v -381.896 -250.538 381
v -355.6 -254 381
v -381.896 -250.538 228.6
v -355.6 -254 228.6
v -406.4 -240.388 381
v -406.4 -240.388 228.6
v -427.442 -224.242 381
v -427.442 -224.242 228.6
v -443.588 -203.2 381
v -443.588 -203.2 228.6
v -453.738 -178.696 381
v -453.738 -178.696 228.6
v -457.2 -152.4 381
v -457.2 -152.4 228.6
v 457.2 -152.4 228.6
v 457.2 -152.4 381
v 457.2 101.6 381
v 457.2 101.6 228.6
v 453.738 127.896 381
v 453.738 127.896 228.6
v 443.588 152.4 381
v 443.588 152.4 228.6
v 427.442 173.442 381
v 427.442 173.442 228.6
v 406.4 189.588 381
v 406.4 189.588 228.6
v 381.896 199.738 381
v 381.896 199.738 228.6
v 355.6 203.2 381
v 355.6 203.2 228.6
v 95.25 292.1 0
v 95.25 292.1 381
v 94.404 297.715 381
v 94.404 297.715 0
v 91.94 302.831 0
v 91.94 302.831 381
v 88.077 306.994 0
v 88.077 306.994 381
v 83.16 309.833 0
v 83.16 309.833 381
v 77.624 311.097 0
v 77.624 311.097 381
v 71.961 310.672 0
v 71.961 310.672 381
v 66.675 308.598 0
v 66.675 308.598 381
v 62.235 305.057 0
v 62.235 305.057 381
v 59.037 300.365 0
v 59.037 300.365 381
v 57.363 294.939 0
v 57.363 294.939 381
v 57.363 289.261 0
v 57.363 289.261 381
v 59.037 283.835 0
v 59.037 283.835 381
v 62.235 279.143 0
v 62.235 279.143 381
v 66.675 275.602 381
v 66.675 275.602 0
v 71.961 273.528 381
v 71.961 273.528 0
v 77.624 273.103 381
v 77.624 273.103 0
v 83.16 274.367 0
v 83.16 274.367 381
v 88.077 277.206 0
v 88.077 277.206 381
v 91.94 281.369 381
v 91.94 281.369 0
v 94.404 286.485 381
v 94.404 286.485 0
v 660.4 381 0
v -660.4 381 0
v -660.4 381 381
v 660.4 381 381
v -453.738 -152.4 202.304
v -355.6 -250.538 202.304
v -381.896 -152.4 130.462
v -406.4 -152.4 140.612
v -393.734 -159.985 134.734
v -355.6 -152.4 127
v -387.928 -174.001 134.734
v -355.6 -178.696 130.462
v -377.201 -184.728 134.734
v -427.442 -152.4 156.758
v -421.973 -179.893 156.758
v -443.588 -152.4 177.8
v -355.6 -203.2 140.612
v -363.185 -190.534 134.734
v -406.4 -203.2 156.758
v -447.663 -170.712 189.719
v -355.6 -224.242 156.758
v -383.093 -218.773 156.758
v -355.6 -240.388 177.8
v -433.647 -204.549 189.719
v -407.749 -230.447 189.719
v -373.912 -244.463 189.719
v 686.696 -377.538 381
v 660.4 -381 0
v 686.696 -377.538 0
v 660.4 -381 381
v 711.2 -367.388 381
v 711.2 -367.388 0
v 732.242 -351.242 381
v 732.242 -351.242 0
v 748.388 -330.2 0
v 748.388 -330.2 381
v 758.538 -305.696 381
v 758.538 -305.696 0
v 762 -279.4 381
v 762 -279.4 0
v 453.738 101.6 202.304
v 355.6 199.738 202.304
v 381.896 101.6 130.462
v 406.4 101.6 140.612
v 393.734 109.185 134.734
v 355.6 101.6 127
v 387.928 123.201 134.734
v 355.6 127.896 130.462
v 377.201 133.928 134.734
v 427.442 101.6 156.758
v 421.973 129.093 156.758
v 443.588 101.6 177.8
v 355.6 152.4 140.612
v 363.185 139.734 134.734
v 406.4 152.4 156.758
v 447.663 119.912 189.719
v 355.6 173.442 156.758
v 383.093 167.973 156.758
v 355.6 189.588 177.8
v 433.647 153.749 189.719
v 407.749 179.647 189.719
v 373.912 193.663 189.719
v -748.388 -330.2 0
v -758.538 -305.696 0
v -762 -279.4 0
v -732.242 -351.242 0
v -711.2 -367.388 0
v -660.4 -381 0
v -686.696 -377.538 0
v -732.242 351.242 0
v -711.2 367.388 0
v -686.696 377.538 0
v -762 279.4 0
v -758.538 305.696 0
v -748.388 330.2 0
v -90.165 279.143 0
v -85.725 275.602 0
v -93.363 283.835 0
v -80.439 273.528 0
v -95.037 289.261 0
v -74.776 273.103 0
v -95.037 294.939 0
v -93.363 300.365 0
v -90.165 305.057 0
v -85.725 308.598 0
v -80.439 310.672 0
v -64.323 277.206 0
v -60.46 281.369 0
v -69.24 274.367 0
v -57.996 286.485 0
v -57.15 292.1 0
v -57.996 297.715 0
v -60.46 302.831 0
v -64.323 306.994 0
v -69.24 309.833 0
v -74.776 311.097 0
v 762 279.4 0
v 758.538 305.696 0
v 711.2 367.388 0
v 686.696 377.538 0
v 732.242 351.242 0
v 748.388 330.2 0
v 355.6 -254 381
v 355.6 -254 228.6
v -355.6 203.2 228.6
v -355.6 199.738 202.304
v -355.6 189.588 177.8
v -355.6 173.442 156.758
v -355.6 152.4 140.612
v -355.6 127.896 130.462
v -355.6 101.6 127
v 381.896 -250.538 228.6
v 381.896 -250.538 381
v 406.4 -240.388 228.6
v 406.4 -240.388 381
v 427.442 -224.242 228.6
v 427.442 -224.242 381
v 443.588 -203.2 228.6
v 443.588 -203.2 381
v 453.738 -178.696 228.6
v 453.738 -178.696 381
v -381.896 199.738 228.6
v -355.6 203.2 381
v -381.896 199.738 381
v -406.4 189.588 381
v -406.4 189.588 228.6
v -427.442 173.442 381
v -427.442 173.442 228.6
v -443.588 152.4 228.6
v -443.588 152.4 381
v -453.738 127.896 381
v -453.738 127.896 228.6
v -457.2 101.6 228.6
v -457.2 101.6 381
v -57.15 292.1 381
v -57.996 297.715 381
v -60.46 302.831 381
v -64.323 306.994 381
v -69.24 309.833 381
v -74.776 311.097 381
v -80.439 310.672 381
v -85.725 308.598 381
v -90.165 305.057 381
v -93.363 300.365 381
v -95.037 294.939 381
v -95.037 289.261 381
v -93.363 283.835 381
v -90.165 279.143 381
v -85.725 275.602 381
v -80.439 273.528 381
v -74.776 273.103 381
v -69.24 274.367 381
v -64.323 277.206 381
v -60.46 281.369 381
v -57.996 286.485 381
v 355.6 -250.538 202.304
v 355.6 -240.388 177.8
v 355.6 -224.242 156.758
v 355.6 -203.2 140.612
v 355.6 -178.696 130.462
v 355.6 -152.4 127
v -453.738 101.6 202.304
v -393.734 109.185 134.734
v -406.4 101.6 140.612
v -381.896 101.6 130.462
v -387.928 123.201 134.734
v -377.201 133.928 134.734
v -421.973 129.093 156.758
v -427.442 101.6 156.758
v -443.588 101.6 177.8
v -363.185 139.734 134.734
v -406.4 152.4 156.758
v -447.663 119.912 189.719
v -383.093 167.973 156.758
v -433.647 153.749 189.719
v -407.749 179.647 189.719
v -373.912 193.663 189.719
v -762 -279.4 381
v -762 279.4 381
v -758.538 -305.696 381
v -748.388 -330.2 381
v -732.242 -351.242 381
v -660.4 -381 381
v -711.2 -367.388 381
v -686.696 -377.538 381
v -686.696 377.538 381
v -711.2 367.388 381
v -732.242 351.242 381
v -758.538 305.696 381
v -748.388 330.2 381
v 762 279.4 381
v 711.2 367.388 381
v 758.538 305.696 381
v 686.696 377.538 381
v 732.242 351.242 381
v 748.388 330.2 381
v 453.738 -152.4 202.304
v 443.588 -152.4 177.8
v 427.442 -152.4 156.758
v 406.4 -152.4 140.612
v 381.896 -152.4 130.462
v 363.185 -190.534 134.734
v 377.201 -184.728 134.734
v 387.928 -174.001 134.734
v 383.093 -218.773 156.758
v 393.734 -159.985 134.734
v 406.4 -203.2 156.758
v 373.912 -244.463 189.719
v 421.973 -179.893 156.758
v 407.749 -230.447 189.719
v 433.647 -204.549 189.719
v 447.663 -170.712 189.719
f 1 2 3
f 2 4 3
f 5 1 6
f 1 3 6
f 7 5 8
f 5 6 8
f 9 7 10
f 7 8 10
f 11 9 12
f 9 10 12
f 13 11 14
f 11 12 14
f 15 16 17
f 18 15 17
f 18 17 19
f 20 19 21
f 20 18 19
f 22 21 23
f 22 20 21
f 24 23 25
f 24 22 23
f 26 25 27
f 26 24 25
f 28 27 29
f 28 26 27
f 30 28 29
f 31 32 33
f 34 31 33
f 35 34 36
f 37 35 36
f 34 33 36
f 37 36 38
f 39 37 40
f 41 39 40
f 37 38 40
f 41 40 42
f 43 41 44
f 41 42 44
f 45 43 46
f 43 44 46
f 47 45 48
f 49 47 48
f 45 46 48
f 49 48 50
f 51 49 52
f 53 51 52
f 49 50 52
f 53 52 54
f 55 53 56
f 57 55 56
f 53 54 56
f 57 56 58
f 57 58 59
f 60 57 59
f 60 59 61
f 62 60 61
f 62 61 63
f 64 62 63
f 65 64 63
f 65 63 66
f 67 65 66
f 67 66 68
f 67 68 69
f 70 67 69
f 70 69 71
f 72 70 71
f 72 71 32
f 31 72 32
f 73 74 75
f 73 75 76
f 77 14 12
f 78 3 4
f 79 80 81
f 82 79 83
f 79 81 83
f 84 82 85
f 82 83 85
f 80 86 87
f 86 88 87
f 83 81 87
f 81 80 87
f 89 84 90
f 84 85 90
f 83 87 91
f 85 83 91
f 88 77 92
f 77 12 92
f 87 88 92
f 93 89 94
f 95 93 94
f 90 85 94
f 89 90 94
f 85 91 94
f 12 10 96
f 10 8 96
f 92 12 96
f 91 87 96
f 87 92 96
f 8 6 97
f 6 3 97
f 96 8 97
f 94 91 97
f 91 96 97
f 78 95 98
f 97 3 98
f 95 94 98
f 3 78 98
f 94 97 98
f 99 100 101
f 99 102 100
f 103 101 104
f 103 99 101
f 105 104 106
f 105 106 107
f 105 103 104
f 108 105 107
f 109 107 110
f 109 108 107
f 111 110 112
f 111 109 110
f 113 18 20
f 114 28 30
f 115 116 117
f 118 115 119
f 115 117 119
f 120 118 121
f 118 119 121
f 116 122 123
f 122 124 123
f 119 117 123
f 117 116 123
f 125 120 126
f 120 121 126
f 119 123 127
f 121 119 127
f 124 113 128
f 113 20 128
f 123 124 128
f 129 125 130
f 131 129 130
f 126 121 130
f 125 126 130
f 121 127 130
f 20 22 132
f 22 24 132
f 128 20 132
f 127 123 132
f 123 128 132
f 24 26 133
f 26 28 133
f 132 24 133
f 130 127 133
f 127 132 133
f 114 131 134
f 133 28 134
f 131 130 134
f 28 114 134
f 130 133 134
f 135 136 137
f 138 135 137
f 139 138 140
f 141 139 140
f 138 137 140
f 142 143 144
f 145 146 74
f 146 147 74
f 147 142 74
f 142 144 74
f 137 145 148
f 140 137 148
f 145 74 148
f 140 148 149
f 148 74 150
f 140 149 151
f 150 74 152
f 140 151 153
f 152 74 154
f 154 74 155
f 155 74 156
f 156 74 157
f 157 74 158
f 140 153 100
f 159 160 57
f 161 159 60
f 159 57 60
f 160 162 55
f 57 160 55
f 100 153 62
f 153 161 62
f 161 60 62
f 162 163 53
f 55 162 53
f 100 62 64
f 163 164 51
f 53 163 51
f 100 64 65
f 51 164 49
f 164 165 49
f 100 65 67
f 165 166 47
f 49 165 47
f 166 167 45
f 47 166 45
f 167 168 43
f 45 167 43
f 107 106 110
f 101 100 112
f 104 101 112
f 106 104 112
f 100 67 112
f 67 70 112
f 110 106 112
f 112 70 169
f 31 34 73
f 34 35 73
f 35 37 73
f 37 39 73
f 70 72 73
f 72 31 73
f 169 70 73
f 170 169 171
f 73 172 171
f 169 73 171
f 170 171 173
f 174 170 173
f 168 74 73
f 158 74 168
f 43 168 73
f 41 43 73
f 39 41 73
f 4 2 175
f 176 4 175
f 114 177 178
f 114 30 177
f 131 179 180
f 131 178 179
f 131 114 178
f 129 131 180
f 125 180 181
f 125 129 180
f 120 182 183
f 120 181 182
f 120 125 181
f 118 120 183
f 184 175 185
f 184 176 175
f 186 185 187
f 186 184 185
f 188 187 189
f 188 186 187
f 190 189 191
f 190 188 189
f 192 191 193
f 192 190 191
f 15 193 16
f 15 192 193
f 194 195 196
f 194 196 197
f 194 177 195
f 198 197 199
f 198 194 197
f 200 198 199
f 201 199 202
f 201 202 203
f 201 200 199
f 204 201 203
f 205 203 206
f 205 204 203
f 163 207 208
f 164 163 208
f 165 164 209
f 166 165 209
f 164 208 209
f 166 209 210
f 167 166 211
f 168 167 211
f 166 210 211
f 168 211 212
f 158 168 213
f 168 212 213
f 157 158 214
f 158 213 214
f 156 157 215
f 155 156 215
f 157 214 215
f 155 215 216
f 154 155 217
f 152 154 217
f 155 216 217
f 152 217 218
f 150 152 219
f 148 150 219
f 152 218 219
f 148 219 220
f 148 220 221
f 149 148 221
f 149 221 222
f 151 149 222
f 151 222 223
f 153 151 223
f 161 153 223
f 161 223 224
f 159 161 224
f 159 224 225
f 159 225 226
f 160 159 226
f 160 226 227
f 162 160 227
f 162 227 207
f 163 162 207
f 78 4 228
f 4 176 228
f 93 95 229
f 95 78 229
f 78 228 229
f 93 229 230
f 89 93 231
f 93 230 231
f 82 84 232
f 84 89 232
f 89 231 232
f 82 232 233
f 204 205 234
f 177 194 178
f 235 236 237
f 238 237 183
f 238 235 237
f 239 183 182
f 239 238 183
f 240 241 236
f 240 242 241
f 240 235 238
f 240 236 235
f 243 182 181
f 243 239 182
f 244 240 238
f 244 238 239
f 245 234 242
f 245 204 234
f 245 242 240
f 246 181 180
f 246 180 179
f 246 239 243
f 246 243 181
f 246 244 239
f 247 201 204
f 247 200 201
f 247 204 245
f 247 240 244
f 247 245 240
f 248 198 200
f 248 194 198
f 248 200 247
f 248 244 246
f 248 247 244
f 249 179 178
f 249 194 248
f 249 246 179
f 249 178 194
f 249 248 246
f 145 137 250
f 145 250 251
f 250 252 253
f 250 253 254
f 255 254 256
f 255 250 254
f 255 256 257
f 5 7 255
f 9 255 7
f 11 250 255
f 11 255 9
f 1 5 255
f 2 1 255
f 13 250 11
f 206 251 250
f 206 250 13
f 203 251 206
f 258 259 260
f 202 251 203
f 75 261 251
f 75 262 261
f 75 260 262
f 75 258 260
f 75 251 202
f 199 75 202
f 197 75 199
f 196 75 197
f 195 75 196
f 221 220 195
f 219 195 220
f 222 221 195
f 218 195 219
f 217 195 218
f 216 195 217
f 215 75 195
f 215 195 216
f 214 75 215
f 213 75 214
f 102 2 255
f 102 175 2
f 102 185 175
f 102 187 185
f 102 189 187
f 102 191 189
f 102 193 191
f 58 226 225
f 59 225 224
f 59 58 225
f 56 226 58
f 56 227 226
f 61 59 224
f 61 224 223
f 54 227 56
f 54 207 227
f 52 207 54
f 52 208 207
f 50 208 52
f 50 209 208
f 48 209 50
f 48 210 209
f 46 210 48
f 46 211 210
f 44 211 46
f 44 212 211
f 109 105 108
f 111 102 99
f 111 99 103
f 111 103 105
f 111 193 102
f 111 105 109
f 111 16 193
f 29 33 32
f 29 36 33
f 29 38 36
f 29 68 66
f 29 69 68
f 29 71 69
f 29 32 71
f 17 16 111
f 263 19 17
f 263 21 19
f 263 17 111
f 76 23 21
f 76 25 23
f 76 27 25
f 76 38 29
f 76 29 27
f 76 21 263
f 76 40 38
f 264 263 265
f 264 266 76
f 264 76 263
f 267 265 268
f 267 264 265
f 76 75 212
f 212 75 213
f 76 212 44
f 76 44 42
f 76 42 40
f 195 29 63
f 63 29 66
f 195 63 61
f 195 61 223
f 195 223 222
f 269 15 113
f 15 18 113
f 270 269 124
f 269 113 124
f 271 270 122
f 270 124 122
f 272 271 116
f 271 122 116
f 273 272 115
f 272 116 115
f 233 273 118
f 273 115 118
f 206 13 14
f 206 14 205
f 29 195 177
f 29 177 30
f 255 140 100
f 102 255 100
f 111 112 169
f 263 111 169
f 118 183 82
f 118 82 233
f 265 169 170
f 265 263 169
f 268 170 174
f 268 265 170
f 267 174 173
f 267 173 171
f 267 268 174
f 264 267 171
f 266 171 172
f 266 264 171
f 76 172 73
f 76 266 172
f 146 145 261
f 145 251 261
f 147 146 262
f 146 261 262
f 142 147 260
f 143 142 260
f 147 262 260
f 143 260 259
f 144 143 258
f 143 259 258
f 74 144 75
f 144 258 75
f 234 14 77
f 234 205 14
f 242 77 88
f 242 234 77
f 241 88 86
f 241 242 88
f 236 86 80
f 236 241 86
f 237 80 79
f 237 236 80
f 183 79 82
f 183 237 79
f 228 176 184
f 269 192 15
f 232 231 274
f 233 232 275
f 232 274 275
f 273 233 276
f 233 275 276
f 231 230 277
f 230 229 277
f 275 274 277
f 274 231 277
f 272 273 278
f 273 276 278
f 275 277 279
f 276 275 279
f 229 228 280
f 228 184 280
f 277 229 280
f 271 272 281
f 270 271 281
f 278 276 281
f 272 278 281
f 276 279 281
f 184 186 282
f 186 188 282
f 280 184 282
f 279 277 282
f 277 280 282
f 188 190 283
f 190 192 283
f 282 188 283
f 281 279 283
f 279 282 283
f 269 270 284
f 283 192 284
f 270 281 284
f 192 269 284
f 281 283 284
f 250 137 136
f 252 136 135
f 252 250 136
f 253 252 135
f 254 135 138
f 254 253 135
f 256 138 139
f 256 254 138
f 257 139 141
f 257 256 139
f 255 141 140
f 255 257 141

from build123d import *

# Parameters (mm, degrees)
F0_W     = 1524
F0_H     = 762
F1_DEPTH = 381
F2_R     = 101.6
F3_W     = 914.4
F3_H     = 457.2
F4_DEPTH = 254
F5_R     = 101.6
F6_R     = 19.05
F7_DEPTH = 381.001
F8_R     = 19.05
F9_DEPTH = 381.001


with BuildPart() as f1:
    # F0 (on Top) → F1 (new body)
    with BuildSketch(Plane.XY):
        Rectangle(F0_W, F0_H)
    extrude(amount=F1_DEPTH)

    # F2
    f2_edges = [f1.edges().sort_by_distance(p)[0] for p in [
        (-762, 381, 190.5),
        (-762, -381, 190.5),
        (762, -381, 190.5),
        (762, 381, 190.5),
    ]]
    fillet(f2_edges, radius=F2_R)

    # F3 (on face) → F4 (cut)
    with BuildSketch(Plane.XY.offset(381)):
        with Locations((0, -25.4)):
            Rectangle(F3_W, F3_H)
    extrude(amount=-F4_DEPTH, mode=Mode.SUBTRACT)

    # F5
    f5_edges = [f1.edges().sort_by_distance(p)[0] for p in [
        (-457.2, 203.2, 254),
        (457.2, 203.2, 254),
        (457.2, -254, 254),
        (-457.2, -254, 254),
        (-457.2, -25.4, 127),
        (0, -254, 127),
        (457.2, -25.4, 127),
        (0, 203.2, 127),
    ]]
    fillet(f5_edges, radius=F5_R)

    # F6 (on face) → F7 (cut, through all)
    with BuildSketch(Plane.XY.offset(381)):
        with Locations((-76.2, 292.1)):
            Circle(F6_R)
    extrude(amount=-F7_DEPTH, mode=Mode.SUBTRACT)

    # F8 (on face) → F9 (cut, through all)
    with BuildSketch(Plane.XY.offset(381)):
        with Locations((76.2, 292.1)):
            Circle(F8_R)
    extrude(amount=-F9_DEPTH, mode=Mode.SUBTRACT)


solid = f1.part
